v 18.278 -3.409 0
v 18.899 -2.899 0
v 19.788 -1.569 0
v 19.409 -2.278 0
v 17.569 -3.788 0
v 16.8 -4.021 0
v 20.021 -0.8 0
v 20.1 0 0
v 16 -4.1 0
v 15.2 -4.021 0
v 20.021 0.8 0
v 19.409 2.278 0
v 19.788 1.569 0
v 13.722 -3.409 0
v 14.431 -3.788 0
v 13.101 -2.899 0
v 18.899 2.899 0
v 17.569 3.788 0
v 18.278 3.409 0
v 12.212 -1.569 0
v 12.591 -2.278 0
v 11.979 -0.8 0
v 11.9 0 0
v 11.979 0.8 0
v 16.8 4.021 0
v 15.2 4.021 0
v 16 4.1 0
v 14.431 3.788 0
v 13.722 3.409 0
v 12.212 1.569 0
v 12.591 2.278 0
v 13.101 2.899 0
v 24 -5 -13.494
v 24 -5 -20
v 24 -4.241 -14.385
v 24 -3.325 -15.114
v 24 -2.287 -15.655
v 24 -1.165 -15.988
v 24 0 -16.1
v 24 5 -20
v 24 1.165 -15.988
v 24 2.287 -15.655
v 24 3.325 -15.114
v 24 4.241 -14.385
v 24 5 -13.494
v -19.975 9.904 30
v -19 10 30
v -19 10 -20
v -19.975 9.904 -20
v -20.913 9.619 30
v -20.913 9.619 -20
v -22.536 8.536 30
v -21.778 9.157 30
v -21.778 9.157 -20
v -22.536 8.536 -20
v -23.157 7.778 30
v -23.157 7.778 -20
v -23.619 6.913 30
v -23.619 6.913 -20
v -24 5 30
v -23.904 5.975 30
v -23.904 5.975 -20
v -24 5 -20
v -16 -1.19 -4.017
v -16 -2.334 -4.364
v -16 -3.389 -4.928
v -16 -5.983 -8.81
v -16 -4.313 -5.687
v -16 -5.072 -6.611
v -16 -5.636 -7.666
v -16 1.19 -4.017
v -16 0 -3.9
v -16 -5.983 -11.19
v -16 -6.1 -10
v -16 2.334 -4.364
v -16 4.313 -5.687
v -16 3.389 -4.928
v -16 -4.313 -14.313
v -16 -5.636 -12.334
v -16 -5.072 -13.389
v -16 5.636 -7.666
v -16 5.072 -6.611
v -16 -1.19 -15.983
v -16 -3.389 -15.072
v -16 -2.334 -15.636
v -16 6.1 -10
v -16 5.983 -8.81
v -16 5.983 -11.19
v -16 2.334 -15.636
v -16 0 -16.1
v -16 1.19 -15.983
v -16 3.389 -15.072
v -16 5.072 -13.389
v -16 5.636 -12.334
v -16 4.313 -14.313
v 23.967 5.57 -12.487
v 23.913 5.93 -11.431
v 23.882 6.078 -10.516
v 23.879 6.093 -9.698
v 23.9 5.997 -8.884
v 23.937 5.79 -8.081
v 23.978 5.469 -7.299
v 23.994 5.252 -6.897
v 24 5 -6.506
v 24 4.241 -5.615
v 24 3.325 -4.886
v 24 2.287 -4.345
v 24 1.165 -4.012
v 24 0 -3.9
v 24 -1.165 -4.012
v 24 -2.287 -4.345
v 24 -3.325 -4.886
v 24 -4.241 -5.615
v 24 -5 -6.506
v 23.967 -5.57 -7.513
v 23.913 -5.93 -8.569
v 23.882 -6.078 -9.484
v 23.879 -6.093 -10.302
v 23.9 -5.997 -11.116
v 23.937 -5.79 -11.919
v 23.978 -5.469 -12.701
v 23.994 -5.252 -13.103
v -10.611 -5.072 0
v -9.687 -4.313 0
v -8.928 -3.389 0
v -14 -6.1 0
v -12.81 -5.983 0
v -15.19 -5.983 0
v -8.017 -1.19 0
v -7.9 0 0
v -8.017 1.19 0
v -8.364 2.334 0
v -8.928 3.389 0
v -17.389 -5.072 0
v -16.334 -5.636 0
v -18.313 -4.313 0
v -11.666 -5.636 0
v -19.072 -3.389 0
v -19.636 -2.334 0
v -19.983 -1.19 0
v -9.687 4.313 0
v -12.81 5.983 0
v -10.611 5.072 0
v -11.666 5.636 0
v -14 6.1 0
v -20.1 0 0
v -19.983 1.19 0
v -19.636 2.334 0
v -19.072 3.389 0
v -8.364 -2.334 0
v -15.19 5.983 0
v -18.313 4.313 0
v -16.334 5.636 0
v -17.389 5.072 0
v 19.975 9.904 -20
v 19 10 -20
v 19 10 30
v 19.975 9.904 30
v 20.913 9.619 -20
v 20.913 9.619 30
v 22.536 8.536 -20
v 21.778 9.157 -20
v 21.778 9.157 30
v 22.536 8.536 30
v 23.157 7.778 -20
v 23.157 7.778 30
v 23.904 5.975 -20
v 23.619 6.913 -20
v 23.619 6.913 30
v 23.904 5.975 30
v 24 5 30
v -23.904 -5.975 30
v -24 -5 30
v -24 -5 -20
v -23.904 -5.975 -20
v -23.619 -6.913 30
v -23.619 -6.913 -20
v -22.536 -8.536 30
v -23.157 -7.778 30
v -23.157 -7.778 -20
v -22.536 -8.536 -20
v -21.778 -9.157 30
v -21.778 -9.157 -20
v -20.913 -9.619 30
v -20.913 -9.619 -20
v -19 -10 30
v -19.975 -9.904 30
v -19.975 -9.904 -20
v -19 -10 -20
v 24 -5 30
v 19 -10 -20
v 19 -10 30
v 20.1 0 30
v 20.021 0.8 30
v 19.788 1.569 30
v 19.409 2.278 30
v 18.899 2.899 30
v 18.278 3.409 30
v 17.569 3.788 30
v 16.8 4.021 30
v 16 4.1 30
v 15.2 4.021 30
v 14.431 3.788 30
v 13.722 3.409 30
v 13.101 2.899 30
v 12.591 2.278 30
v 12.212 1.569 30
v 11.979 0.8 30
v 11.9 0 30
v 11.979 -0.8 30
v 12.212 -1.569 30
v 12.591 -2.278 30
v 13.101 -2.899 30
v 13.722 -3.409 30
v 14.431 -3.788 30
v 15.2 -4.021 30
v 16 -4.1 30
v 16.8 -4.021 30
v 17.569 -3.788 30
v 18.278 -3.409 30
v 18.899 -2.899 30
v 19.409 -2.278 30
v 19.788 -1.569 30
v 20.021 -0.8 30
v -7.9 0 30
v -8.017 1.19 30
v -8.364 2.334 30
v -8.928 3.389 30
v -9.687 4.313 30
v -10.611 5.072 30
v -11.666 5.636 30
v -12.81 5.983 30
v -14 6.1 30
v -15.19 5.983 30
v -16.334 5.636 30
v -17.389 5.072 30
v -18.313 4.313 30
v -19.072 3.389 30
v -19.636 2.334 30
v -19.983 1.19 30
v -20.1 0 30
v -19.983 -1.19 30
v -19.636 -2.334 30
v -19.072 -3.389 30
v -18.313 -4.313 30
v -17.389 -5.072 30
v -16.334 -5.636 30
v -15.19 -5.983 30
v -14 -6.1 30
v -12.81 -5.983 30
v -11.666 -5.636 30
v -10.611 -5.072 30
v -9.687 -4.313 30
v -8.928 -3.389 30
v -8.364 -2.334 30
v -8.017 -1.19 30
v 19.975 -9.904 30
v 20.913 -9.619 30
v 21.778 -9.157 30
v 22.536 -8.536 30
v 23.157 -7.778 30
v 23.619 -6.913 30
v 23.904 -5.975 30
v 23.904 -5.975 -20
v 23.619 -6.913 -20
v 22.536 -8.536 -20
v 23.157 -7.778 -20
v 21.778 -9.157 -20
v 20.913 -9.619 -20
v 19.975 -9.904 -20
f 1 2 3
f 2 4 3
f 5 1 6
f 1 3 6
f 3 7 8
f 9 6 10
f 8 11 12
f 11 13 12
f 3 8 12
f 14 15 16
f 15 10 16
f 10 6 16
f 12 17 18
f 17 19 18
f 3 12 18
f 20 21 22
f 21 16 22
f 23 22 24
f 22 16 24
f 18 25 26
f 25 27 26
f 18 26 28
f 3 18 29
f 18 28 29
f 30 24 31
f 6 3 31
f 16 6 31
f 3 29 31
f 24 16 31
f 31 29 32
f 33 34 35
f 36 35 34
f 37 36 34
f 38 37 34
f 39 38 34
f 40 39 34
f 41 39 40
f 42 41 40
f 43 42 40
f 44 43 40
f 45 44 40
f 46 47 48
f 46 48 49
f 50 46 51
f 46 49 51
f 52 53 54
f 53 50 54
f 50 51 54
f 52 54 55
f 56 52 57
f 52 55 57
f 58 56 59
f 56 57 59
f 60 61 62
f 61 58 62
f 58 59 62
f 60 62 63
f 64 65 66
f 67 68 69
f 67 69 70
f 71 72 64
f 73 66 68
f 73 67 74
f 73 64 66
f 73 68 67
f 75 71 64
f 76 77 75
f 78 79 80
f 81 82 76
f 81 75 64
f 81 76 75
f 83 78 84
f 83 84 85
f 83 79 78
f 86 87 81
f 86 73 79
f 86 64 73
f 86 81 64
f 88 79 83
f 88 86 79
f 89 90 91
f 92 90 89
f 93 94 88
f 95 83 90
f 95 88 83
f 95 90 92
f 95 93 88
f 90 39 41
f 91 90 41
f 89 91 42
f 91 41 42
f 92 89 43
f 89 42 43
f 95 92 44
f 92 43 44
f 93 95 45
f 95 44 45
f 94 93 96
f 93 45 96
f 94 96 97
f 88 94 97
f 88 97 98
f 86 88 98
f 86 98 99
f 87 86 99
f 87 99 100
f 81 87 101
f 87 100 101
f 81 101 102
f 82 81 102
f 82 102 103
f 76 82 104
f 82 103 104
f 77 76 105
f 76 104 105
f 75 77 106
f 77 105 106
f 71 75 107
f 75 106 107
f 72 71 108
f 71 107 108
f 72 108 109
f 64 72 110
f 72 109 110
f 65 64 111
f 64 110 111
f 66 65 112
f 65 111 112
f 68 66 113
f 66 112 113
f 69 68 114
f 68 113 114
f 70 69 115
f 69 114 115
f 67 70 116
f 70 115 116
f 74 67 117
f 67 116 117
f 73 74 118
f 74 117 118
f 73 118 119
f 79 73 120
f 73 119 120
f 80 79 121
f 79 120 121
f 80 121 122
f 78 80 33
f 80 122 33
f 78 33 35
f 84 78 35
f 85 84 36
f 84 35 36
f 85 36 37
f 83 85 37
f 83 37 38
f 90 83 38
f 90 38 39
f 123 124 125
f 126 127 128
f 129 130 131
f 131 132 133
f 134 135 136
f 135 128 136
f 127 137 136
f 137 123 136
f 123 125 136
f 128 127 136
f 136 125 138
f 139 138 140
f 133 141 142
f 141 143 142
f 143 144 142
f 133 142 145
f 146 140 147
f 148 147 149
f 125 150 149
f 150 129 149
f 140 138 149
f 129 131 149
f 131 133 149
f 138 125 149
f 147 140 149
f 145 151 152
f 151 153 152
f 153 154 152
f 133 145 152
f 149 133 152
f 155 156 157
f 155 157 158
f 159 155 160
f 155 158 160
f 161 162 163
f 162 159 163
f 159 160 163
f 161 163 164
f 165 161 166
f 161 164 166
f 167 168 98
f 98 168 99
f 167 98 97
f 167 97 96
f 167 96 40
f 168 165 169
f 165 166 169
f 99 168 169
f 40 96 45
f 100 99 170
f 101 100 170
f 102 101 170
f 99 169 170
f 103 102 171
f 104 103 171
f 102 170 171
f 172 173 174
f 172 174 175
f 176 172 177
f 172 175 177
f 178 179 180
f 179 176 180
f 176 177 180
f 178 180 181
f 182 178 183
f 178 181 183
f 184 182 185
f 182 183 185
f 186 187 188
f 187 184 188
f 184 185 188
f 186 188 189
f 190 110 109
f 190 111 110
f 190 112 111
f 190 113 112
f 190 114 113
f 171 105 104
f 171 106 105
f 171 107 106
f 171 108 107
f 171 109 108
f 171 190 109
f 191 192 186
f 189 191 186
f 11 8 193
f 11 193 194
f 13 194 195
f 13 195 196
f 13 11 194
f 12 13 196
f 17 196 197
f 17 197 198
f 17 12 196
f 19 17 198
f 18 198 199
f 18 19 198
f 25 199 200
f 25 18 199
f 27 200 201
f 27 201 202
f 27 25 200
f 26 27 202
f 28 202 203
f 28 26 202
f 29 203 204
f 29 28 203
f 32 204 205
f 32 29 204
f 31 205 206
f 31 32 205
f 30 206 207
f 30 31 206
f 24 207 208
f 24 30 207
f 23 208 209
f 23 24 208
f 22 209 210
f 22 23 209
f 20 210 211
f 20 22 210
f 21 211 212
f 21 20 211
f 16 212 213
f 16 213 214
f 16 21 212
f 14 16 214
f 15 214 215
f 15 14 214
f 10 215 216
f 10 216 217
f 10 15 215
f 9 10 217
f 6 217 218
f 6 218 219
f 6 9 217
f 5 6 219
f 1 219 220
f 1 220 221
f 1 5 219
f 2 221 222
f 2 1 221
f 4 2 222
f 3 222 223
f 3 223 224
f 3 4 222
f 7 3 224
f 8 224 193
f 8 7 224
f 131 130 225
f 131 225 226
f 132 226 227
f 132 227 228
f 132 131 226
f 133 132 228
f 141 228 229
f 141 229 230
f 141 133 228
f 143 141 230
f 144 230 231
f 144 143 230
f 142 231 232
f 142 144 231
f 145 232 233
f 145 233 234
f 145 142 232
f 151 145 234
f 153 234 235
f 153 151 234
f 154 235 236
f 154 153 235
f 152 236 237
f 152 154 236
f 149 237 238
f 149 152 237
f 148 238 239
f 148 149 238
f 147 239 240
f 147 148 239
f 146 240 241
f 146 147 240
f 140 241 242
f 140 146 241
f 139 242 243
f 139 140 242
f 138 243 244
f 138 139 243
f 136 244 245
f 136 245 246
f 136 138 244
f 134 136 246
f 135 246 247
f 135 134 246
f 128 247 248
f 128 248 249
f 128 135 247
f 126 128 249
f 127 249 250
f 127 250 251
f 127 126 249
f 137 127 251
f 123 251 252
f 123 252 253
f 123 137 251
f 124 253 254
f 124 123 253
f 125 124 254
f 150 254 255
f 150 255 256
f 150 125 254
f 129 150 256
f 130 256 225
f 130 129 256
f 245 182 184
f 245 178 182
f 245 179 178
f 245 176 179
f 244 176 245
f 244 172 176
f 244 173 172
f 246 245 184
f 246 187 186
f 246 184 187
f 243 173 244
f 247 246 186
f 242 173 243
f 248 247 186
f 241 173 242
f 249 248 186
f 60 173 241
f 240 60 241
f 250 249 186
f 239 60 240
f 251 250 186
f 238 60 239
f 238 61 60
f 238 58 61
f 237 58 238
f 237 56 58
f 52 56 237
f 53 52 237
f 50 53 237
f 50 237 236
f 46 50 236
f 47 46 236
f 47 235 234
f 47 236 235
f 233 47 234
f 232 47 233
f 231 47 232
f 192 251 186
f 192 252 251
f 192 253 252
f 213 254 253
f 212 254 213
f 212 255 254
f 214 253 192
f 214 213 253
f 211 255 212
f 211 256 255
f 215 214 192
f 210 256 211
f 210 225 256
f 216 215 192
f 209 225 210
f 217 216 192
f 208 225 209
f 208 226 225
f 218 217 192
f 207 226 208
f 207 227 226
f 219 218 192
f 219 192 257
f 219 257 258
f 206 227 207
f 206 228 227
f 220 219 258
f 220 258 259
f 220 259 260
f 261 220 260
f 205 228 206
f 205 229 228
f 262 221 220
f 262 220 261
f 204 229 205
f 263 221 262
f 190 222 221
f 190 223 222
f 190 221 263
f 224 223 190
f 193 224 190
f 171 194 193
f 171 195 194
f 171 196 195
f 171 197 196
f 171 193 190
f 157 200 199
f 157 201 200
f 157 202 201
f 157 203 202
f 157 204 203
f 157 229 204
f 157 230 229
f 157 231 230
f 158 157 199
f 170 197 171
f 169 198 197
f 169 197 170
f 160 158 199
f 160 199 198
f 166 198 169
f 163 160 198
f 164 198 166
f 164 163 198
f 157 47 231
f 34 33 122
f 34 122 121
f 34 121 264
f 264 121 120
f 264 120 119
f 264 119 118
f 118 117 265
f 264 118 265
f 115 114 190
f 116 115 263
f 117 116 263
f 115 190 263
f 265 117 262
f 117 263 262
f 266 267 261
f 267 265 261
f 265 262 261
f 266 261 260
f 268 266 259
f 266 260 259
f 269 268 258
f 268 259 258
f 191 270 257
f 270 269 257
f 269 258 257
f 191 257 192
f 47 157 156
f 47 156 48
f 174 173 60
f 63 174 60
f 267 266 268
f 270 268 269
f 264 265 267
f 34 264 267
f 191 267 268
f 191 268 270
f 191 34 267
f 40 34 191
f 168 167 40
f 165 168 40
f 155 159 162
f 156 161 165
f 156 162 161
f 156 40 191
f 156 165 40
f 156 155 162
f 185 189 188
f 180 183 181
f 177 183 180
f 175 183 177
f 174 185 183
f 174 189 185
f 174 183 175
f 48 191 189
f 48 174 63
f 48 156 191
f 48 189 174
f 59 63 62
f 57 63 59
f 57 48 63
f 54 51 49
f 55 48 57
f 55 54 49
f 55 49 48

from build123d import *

# Parameters (mm, degrees)
SKETCH1_W           = 48
SKETCH1_H           = 20
SKETCH1_R           = 6.1
SKETCH1_R_2         = 4.1
BOSS_EXTRUDE1_DEPTH = 30
SKETCH2_W           = 48
SKETCH2_H           = 20
BOSS_EXTRUDE2_DEPTH = 20
SKETCH3_R           = 6.1
CUT_EXTRUDE1_DEPTH  = 40
FILLET1_R           = 5


with BuildPart() as part:
    # Sketch1 → Boss-Extrude1 (new body)
    with BuildSketch(Plane.XY):
        Rectangle(SKETCH1_W, SKETCH1_H)
        with Locations((-14, 0)):
            Circle(SKETCH1_R, mode=Mode.SUBTRACT)
        with Locations((16, 0)):
            Circle(SKETCH1_R_2, mode=Mode.SUBTRACT)
    extrude(amount=BOSS_EXTRUDE1_DEPTH)

    # Sketch2 → Boss-Extrude2 (add)
    with BuildSketch(Plane(origin=(0, 0, 0), x_dir=(-1, 0, 0), z_dir=(0, 0, -1))):
        Rectangle(SKETCH2_W, SKETCH2_H)
    extrude(amount=BOSS_EXTRUDE2_DEPTH)

    # Sketch3 → Cut-Extrude1 (cut)
    with BuildSketch(Plane(origin=(24, 0, 0), x_dir=(0, 0, -1), z_dir=(1, 0, 0))):
        with Locations((10, 0)):
            Circle(SKETCH3_R)
    extrude(amount=-CUT_EXTRUDE1_DEPTH, mode=Mode.SUBTRACT)

    # Fillet1
    # the kernel refuses this fillet: 5 mm, written as the material it takes off along each edge
    with BuildSketch(Plane(origin=(24, -10, 42.5), x_dir=(0, 1, 0), z_dir=(0, 0, -1)), Plane(origin=(-24, -10, -32.5), x_dir=(0, 1, 0), z_dir=(0, 0, 1)), Plane(origin=(-24, 10, -32.5), x_dir=(1, 0, 0), z_dir=(0, 0, 1)), Plane(origin=(24, 10, 42.5), x_dir=(-1, 0, 0), z_dir=(0, 0, -1))) as fillet1_piece_1:
        with BuildLine():
            CenterArc((FILLET1_R, -FILLET1_R), FILLET1_R, 90, 90)
            Line((0, -FILLET1_R), (0, 0))
            Line((0, 0), (FILLET1_R, 0))
        make_face()
    extrude(amount=75, mode=Mode.SUBTRACT)


solid = part.part
